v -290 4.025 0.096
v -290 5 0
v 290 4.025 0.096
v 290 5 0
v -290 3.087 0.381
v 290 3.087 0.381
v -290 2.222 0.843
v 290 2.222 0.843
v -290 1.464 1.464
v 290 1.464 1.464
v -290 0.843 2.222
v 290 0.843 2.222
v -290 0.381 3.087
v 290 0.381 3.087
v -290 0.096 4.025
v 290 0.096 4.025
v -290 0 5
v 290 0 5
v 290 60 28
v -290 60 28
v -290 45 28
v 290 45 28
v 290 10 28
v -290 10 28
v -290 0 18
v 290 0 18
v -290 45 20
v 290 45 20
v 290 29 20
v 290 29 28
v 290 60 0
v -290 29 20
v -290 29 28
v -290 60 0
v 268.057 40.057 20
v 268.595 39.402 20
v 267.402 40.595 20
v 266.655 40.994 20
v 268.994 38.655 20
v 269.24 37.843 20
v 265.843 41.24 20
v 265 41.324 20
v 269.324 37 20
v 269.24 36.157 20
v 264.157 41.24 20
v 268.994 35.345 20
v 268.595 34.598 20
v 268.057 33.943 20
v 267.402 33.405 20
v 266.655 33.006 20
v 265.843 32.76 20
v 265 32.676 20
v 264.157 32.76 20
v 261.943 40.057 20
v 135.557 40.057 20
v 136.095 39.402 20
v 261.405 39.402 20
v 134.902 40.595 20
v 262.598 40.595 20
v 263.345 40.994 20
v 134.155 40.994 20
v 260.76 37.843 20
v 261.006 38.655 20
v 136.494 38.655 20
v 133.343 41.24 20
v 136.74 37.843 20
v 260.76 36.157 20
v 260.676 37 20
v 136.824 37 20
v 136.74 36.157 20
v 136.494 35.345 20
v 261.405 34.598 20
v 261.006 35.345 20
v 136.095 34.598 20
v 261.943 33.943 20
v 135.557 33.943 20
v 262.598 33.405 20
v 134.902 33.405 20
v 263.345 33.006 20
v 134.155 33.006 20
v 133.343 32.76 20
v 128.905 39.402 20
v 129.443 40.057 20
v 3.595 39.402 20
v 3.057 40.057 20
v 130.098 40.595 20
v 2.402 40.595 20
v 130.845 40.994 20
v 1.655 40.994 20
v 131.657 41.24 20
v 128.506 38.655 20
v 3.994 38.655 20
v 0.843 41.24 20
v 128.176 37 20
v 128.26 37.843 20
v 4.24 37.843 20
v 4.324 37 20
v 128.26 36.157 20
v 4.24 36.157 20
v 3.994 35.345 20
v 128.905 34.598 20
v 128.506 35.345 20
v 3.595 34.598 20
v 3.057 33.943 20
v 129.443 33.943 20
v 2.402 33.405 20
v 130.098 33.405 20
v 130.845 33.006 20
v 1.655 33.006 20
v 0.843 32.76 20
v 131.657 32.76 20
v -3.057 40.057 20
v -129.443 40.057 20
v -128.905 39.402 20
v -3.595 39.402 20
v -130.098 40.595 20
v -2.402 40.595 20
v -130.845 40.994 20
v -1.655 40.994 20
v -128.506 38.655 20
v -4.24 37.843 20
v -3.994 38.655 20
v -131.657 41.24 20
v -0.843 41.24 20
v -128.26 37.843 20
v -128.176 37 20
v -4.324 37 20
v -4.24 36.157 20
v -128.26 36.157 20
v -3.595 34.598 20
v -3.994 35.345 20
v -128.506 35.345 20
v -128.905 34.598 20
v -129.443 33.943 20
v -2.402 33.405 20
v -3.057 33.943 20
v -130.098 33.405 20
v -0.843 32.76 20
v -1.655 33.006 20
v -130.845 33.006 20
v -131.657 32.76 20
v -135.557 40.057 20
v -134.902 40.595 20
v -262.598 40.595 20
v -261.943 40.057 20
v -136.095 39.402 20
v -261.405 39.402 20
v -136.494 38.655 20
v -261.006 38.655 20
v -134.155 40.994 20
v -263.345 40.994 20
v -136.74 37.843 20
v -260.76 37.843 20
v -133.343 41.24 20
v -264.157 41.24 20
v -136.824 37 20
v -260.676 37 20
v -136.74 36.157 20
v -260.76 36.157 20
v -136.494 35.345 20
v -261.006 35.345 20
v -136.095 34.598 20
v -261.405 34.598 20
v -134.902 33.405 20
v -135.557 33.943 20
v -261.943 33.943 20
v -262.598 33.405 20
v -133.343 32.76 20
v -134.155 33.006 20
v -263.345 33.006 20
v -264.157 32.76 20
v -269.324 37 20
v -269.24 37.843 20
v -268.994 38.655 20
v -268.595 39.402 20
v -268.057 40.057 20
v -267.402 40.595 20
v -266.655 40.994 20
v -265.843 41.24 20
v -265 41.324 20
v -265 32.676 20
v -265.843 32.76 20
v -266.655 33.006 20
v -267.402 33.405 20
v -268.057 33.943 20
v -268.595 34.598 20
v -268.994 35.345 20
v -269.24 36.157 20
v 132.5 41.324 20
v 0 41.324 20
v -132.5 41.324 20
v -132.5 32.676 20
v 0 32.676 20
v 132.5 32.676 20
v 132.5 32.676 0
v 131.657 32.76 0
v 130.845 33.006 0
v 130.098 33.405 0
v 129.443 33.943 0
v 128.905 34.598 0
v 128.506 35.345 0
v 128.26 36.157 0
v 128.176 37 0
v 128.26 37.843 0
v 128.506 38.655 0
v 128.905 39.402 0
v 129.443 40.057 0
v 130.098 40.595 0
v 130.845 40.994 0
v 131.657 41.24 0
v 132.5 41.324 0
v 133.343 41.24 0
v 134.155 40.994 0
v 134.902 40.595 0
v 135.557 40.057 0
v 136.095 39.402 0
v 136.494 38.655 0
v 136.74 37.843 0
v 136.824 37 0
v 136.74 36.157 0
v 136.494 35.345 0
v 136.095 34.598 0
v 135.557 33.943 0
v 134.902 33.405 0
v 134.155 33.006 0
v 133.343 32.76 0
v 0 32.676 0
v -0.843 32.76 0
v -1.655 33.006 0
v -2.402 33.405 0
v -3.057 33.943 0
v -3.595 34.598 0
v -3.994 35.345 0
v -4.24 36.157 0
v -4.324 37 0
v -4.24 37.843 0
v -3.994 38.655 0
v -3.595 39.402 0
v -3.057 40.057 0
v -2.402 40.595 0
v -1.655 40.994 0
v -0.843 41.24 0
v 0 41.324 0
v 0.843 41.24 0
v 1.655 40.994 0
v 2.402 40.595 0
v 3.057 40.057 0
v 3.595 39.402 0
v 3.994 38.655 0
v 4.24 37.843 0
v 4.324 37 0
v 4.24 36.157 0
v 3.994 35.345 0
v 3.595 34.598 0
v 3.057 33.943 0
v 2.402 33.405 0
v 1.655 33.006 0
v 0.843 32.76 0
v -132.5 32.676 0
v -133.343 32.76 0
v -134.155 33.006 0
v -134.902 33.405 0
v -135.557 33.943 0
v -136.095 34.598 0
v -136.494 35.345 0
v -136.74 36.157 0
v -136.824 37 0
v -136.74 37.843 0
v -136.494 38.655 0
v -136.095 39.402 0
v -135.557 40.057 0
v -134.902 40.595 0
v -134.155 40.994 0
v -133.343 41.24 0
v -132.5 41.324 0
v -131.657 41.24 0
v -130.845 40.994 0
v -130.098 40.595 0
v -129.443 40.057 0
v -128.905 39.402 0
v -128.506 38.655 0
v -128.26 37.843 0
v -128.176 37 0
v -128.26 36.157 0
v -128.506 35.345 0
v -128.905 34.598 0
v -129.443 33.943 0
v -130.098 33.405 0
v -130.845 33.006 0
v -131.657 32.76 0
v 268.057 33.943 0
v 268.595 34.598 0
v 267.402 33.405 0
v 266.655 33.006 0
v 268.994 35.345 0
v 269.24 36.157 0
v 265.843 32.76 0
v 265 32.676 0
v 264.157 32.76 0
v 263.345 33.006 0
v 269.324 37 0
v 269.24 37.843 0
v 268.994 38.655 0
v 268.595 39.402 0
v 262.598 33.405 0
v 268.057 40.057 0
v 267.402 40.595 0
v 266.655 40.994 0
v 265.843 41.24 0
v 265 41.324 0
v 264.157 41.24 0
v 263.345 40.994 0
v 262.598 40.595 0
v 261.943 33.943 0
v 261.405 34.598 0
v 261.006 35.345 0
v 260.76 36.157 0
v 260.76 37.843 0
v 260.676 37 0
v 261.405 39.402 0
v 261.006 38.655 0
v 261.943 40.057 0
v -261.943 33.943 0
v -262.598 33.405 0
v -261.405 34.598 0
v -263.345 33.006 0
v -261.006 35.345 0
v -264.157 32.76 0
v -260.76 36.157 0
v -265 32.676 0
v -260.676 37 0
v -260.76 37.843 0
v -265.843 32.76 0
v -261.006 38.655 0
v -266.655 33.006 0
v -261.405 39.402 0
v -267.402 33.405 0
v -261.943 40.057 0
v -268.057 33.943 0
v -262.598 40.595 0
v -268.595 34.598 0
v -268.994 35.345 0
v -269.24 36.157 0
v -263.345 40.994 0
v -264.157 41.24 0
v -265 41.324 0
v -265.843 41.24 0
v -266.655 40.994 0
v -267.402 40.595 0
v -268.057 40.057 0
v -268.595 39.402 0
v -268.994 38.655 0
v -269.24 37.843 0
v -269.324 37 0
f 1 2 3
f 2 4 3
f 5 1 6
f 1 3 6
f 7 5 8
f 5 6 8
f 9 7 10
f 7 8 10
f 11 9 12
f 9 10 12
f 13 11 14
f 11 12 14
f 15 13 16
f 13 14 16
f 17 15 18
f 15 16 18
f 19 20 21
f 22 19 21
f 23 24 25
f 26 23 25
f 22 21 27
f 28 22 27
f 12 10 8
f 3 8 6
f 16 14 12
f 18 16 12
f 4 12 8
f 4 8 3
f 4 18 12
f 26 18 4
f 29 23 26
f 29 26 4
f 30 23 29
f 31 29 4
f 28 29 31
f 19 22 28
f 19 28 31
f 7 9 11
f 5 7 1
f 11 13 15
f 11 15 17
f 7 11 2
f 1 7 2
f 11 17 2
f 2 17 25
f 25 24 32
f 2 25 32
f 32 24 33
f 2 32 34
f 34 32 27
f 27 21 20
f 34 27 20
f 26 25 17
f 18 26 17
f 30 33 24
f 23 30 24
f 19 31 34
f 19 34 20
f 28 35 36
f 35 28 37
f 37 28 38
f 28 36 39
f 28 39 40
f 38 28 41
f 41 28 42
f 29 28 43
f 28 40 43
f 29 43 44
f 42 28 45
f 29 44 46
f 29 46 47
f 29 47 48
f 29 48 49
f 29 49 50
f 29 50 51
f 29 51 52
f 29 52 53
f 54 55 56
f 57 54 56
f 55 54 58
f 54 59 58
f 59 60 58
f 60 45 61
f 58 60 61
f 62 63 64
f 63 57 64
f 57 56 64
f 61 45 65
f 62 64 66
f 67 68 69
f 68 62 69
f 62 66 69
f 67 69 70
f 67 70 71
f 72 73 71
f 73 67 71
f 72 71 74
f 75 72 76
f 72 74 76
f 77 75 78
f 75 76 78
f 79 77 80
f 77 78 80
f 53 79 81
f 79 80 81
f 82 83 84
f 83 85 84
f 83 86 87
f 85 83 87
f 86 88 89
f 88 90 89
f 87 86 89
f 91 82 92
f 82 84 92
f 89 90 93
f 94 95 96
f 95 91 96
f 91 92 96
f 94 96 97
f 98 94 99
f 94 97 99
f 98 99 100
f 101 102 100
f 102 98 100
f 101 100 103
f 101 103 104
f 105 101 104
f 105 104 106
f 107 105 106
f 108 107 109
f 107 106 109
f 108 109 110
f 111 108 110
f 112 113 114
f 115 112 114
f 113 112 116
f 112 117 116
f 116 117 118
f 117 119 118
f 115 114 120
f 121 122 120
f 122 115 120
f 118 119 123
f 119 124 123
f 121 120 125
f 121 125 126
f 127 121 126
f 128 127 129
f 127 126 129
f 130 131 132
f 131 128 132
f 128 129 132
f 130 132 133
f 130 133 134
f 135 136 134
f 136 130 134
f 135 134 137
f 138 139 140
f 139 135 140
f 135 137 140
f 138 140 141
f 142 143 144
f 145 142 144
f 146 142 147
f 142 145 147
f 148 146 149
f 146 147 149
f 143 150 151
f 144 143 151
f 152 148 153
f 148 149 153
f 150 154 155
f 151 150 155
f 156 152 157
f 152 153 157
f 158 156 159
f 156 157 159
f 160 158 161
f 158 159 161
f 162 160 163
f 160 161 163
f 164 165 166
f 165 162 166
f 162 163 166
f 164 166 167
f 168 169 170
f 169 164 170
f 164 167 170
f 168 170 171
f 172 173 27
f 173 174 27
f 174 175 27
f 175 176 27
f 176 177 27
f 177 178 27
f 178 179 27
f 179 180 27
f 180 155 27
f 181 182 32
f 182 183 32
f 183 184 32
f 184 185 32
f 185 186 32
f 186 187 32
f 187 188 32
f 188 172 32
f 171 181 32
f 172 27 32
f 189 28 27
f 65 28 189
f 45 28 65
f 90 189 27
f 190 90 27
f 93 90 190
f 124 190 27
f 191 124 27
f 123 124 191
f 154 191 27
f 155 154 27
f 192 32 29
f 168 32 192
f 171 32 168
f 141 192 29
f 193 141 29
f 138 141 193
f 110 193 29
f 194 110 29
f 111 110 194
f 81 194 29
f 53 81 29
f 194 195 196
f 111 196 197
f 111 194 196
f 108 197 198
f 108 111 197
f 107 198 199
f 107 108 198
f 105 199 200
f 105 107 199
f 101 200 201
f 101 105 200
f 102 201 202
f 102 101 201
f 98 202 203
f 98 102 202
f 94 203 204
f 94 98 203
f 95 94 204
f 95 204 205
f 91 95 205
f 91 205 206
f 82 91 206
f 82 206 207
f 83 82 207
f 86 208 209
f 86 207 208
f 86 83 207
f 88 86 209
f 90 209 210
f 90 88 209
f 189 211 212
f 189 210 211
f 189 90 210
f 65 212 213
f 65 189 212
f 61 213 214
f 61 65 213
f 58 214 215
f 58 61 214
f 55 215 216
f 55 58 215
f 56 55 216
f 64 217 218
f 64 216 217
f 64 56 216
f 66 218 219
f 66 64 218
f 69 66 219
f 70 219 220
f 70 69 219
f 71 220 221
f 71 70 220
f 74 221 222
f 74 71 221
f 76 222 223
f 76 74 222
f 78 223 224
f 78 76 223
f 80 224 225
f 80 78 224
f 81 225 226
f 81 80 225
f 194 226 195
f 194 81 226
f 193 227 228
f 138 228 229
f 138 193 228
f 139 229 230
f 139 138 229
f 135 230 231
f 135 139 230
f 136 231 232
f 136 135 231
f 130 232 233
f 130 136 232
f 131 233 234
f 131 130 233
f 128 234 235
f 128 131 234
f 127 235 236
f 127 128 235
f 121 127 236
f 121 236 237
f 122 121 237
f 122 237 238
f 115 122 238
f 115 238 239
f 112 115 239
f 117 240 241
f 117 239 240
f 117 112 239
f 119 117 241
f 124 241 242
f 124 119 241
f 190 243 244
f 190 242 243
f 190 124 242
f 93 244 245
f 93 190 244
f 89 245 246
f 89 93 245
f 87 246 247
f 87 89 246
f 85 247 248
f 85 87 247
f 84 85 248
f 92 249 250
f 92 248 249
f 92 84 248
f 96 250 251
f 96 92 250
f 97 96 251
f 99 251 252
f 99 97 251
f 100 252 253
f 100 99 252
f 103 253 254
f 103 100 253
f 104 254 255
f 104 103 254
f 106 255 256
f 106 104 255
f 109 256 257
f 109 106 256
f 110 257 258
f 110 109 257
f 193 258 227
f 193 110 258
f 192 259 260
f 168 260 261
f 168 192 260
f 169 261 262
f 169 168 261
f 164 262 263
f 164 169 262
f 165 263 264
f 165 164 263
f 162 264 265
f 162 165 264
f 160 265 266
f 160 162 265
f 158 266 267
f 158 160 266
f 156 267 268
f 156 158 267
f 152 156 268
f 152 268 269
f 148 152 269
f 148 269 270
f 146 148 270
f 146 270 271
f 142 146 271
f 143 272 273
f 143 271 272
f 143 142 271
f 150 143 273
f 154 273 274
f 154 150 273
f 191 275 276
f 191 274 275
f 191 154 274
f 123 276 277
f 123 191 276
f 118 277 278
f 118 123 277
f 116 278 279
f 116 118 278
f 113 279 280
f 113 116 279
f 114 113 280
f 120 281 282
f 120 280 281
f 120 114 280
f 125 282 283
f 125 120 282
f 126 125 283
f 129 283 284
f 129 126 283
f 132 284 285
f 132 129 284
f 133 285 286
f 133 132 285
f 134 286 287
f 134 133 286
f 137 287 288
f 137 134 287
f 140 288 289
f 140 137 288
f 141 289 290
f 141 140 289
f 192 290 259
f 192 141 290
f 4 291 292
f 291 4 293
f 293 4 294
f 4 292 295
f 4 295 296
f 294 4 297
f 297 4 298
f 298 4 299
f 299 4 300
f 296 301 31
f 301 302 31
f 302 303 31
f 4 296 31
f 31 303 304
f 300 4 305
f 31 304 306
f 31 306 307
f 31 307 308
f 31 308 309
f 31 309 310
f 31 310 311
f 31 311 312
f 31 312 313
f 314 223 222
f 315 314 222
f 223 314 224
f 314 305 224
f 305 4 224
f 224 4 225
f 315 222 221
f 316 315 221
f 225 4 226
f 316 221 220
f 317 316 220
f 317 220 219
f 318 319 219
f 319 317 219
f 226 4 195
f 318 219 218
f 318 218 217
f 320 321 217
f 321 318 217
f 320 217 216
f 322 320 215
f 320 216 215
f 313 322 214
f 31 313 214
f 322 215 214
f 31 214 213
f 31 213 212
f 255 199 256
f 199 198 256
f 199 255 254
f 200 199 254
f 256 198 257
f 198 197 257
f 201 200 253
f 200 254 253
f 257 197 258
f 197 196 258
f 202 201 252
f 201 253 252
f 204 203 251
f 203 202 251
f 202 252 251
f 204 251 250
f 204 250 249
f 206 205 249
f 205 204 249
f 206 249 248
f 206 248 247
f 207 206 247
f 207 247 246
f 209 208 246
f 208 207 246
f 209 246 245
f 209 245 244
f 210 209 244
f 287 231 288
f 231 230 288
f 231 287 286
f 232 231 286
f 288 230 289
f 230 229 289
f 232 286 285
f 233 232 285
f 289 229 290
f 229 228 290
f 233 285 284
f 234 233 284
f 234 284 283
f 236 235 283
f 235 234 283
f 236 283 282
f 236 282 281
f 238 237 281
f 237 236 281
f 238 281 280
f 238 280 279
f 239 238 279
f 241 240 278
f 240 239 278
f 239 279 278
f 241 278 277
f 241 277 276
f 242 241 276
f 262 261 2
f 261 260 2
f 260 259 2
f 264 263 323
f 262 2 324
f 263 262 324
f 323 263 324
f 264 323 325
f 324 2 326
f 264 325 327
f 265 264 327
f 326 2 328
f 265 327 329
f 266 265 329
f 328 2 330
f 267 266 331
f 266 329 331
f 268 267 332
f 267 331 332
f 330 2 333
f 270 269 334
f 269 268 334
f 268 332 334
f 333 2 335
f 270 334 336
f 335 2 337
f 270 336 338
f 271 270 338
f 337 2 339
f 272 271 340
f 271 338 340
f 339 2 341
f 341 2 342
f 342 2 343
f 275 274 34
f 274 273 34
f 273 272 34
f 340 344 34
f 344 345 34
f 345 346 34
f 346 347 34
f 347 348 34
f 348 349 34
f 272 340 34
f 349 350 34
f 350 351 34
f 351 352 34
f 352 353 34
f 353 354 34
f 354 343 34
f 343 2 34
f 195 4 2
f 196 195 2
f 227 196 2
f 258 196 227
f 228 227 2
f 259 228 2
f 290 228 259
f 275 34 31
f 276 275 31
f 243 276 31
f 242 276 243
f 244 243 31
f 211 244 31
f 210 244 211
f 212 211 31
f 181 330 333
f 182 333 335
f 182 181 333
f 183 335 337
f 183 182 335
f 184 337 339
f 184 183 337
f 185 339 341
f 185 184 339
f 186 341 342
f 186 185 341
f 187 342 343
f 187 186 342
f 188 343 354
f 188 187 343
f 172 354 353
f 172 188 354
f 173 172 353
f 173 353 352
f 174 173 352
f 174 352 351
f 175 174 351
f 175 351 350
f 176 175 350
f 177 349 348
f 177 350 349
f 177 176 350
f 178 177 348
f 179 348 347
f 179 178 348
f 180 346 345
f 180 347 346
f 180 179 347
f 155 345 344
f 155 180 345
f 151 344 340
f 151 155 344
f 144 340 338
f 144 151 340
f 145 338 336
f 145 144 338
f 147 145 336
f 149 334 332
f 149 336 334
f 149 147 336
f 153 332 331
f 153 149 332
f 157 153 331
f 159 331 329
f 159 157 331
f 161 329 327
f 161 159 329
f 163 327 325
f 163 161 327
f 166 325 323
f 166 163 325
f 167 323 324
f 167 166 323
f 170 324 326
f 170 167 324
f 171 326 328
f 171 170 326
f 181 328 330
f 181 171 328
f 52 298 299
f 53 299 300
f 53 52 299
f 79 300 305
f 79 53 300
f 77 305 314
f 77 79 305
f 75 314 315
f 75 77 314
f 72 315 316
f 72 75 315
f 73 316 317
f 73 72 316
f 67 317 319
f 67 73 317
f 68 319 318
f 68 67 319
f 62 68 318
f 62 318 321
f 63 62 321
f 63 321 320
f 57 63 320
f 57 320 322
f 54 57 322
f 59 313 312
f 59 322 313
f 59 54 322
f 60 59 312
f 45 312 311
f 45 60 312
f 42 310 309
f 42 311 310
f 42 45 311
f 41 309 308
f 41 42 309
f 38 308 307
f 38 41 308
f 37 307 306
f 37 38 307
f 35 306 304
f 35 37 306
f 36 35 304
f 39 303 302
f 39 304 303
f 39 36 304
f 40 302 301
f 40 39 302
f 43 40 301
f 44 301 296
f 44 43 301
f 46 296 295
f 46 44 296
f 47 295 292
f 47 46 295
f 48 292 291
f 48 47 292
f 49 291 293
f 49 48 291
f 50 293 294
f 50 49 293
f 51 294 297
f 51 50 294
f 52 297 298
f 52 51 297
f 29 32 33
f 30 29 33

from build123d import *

# Parameters (mm, degrees)
EXTRUDE_1_DEPTH        = 290
EXTRUDE_1_DEPTH_BACK   = 290
PATTERN_LINEAR_1_COUNT = 5
PATTERN_LINEAR_1_PITCH = 132.5
FILLET_1_R             = 5


with BuildPart() as part:
    # 草圖1 → 擠出1 (new, two sides: drawn at the far end of the back side and taken through both)
    with BuildSketch(Plane.YZ.offset(-EXTRUDE_1_DEPTH_BACK)):
        Polygon((0, 0), (60, 0), (60, 28), (45, 28), (45, 20), (29, 20), (29, 28), (10, 28), (0, 18), align=None)
    extrude(amount=EXTRUDE_1_DEPTH + EXTRUDE_1_DEPTH_BACK)

    # 草圖2 → 孔1 (revolve, cut)
    with BuildSketch(Plane(origin=(-265, 37, 20), x_dir=(0, -1, 0), z_dir=(1, 0, 0))):
        Polygon((0, 0), (0, 52.597820886), (4.3235, 50), (4.3235, 0), align=None)
    hole_wizard_1 = revolve(axis=Axis((-265, 37, 24.244199587), (0, 0, -1)), mode=Mode.SUBTRACT)

    # 矩形陣列1: 孔1 ×5
    with Locations(*[(i * PATTERN_LINEAR_1_PITCH, 0, 0) for i in range(1, PATTERN_LINEAR_1_COUNT)]):
        add(hole_wizard_1, mode=Mode.SUBTRACT)

    # 圓角1
    fillet_1_edges = [part.edges().sort_by_distance(p)[0] for p in [
        (0, 0, 0),
    ]]
    fillet(fillet_1_edges, radius=FILLET_1_R)


solid = part.part
